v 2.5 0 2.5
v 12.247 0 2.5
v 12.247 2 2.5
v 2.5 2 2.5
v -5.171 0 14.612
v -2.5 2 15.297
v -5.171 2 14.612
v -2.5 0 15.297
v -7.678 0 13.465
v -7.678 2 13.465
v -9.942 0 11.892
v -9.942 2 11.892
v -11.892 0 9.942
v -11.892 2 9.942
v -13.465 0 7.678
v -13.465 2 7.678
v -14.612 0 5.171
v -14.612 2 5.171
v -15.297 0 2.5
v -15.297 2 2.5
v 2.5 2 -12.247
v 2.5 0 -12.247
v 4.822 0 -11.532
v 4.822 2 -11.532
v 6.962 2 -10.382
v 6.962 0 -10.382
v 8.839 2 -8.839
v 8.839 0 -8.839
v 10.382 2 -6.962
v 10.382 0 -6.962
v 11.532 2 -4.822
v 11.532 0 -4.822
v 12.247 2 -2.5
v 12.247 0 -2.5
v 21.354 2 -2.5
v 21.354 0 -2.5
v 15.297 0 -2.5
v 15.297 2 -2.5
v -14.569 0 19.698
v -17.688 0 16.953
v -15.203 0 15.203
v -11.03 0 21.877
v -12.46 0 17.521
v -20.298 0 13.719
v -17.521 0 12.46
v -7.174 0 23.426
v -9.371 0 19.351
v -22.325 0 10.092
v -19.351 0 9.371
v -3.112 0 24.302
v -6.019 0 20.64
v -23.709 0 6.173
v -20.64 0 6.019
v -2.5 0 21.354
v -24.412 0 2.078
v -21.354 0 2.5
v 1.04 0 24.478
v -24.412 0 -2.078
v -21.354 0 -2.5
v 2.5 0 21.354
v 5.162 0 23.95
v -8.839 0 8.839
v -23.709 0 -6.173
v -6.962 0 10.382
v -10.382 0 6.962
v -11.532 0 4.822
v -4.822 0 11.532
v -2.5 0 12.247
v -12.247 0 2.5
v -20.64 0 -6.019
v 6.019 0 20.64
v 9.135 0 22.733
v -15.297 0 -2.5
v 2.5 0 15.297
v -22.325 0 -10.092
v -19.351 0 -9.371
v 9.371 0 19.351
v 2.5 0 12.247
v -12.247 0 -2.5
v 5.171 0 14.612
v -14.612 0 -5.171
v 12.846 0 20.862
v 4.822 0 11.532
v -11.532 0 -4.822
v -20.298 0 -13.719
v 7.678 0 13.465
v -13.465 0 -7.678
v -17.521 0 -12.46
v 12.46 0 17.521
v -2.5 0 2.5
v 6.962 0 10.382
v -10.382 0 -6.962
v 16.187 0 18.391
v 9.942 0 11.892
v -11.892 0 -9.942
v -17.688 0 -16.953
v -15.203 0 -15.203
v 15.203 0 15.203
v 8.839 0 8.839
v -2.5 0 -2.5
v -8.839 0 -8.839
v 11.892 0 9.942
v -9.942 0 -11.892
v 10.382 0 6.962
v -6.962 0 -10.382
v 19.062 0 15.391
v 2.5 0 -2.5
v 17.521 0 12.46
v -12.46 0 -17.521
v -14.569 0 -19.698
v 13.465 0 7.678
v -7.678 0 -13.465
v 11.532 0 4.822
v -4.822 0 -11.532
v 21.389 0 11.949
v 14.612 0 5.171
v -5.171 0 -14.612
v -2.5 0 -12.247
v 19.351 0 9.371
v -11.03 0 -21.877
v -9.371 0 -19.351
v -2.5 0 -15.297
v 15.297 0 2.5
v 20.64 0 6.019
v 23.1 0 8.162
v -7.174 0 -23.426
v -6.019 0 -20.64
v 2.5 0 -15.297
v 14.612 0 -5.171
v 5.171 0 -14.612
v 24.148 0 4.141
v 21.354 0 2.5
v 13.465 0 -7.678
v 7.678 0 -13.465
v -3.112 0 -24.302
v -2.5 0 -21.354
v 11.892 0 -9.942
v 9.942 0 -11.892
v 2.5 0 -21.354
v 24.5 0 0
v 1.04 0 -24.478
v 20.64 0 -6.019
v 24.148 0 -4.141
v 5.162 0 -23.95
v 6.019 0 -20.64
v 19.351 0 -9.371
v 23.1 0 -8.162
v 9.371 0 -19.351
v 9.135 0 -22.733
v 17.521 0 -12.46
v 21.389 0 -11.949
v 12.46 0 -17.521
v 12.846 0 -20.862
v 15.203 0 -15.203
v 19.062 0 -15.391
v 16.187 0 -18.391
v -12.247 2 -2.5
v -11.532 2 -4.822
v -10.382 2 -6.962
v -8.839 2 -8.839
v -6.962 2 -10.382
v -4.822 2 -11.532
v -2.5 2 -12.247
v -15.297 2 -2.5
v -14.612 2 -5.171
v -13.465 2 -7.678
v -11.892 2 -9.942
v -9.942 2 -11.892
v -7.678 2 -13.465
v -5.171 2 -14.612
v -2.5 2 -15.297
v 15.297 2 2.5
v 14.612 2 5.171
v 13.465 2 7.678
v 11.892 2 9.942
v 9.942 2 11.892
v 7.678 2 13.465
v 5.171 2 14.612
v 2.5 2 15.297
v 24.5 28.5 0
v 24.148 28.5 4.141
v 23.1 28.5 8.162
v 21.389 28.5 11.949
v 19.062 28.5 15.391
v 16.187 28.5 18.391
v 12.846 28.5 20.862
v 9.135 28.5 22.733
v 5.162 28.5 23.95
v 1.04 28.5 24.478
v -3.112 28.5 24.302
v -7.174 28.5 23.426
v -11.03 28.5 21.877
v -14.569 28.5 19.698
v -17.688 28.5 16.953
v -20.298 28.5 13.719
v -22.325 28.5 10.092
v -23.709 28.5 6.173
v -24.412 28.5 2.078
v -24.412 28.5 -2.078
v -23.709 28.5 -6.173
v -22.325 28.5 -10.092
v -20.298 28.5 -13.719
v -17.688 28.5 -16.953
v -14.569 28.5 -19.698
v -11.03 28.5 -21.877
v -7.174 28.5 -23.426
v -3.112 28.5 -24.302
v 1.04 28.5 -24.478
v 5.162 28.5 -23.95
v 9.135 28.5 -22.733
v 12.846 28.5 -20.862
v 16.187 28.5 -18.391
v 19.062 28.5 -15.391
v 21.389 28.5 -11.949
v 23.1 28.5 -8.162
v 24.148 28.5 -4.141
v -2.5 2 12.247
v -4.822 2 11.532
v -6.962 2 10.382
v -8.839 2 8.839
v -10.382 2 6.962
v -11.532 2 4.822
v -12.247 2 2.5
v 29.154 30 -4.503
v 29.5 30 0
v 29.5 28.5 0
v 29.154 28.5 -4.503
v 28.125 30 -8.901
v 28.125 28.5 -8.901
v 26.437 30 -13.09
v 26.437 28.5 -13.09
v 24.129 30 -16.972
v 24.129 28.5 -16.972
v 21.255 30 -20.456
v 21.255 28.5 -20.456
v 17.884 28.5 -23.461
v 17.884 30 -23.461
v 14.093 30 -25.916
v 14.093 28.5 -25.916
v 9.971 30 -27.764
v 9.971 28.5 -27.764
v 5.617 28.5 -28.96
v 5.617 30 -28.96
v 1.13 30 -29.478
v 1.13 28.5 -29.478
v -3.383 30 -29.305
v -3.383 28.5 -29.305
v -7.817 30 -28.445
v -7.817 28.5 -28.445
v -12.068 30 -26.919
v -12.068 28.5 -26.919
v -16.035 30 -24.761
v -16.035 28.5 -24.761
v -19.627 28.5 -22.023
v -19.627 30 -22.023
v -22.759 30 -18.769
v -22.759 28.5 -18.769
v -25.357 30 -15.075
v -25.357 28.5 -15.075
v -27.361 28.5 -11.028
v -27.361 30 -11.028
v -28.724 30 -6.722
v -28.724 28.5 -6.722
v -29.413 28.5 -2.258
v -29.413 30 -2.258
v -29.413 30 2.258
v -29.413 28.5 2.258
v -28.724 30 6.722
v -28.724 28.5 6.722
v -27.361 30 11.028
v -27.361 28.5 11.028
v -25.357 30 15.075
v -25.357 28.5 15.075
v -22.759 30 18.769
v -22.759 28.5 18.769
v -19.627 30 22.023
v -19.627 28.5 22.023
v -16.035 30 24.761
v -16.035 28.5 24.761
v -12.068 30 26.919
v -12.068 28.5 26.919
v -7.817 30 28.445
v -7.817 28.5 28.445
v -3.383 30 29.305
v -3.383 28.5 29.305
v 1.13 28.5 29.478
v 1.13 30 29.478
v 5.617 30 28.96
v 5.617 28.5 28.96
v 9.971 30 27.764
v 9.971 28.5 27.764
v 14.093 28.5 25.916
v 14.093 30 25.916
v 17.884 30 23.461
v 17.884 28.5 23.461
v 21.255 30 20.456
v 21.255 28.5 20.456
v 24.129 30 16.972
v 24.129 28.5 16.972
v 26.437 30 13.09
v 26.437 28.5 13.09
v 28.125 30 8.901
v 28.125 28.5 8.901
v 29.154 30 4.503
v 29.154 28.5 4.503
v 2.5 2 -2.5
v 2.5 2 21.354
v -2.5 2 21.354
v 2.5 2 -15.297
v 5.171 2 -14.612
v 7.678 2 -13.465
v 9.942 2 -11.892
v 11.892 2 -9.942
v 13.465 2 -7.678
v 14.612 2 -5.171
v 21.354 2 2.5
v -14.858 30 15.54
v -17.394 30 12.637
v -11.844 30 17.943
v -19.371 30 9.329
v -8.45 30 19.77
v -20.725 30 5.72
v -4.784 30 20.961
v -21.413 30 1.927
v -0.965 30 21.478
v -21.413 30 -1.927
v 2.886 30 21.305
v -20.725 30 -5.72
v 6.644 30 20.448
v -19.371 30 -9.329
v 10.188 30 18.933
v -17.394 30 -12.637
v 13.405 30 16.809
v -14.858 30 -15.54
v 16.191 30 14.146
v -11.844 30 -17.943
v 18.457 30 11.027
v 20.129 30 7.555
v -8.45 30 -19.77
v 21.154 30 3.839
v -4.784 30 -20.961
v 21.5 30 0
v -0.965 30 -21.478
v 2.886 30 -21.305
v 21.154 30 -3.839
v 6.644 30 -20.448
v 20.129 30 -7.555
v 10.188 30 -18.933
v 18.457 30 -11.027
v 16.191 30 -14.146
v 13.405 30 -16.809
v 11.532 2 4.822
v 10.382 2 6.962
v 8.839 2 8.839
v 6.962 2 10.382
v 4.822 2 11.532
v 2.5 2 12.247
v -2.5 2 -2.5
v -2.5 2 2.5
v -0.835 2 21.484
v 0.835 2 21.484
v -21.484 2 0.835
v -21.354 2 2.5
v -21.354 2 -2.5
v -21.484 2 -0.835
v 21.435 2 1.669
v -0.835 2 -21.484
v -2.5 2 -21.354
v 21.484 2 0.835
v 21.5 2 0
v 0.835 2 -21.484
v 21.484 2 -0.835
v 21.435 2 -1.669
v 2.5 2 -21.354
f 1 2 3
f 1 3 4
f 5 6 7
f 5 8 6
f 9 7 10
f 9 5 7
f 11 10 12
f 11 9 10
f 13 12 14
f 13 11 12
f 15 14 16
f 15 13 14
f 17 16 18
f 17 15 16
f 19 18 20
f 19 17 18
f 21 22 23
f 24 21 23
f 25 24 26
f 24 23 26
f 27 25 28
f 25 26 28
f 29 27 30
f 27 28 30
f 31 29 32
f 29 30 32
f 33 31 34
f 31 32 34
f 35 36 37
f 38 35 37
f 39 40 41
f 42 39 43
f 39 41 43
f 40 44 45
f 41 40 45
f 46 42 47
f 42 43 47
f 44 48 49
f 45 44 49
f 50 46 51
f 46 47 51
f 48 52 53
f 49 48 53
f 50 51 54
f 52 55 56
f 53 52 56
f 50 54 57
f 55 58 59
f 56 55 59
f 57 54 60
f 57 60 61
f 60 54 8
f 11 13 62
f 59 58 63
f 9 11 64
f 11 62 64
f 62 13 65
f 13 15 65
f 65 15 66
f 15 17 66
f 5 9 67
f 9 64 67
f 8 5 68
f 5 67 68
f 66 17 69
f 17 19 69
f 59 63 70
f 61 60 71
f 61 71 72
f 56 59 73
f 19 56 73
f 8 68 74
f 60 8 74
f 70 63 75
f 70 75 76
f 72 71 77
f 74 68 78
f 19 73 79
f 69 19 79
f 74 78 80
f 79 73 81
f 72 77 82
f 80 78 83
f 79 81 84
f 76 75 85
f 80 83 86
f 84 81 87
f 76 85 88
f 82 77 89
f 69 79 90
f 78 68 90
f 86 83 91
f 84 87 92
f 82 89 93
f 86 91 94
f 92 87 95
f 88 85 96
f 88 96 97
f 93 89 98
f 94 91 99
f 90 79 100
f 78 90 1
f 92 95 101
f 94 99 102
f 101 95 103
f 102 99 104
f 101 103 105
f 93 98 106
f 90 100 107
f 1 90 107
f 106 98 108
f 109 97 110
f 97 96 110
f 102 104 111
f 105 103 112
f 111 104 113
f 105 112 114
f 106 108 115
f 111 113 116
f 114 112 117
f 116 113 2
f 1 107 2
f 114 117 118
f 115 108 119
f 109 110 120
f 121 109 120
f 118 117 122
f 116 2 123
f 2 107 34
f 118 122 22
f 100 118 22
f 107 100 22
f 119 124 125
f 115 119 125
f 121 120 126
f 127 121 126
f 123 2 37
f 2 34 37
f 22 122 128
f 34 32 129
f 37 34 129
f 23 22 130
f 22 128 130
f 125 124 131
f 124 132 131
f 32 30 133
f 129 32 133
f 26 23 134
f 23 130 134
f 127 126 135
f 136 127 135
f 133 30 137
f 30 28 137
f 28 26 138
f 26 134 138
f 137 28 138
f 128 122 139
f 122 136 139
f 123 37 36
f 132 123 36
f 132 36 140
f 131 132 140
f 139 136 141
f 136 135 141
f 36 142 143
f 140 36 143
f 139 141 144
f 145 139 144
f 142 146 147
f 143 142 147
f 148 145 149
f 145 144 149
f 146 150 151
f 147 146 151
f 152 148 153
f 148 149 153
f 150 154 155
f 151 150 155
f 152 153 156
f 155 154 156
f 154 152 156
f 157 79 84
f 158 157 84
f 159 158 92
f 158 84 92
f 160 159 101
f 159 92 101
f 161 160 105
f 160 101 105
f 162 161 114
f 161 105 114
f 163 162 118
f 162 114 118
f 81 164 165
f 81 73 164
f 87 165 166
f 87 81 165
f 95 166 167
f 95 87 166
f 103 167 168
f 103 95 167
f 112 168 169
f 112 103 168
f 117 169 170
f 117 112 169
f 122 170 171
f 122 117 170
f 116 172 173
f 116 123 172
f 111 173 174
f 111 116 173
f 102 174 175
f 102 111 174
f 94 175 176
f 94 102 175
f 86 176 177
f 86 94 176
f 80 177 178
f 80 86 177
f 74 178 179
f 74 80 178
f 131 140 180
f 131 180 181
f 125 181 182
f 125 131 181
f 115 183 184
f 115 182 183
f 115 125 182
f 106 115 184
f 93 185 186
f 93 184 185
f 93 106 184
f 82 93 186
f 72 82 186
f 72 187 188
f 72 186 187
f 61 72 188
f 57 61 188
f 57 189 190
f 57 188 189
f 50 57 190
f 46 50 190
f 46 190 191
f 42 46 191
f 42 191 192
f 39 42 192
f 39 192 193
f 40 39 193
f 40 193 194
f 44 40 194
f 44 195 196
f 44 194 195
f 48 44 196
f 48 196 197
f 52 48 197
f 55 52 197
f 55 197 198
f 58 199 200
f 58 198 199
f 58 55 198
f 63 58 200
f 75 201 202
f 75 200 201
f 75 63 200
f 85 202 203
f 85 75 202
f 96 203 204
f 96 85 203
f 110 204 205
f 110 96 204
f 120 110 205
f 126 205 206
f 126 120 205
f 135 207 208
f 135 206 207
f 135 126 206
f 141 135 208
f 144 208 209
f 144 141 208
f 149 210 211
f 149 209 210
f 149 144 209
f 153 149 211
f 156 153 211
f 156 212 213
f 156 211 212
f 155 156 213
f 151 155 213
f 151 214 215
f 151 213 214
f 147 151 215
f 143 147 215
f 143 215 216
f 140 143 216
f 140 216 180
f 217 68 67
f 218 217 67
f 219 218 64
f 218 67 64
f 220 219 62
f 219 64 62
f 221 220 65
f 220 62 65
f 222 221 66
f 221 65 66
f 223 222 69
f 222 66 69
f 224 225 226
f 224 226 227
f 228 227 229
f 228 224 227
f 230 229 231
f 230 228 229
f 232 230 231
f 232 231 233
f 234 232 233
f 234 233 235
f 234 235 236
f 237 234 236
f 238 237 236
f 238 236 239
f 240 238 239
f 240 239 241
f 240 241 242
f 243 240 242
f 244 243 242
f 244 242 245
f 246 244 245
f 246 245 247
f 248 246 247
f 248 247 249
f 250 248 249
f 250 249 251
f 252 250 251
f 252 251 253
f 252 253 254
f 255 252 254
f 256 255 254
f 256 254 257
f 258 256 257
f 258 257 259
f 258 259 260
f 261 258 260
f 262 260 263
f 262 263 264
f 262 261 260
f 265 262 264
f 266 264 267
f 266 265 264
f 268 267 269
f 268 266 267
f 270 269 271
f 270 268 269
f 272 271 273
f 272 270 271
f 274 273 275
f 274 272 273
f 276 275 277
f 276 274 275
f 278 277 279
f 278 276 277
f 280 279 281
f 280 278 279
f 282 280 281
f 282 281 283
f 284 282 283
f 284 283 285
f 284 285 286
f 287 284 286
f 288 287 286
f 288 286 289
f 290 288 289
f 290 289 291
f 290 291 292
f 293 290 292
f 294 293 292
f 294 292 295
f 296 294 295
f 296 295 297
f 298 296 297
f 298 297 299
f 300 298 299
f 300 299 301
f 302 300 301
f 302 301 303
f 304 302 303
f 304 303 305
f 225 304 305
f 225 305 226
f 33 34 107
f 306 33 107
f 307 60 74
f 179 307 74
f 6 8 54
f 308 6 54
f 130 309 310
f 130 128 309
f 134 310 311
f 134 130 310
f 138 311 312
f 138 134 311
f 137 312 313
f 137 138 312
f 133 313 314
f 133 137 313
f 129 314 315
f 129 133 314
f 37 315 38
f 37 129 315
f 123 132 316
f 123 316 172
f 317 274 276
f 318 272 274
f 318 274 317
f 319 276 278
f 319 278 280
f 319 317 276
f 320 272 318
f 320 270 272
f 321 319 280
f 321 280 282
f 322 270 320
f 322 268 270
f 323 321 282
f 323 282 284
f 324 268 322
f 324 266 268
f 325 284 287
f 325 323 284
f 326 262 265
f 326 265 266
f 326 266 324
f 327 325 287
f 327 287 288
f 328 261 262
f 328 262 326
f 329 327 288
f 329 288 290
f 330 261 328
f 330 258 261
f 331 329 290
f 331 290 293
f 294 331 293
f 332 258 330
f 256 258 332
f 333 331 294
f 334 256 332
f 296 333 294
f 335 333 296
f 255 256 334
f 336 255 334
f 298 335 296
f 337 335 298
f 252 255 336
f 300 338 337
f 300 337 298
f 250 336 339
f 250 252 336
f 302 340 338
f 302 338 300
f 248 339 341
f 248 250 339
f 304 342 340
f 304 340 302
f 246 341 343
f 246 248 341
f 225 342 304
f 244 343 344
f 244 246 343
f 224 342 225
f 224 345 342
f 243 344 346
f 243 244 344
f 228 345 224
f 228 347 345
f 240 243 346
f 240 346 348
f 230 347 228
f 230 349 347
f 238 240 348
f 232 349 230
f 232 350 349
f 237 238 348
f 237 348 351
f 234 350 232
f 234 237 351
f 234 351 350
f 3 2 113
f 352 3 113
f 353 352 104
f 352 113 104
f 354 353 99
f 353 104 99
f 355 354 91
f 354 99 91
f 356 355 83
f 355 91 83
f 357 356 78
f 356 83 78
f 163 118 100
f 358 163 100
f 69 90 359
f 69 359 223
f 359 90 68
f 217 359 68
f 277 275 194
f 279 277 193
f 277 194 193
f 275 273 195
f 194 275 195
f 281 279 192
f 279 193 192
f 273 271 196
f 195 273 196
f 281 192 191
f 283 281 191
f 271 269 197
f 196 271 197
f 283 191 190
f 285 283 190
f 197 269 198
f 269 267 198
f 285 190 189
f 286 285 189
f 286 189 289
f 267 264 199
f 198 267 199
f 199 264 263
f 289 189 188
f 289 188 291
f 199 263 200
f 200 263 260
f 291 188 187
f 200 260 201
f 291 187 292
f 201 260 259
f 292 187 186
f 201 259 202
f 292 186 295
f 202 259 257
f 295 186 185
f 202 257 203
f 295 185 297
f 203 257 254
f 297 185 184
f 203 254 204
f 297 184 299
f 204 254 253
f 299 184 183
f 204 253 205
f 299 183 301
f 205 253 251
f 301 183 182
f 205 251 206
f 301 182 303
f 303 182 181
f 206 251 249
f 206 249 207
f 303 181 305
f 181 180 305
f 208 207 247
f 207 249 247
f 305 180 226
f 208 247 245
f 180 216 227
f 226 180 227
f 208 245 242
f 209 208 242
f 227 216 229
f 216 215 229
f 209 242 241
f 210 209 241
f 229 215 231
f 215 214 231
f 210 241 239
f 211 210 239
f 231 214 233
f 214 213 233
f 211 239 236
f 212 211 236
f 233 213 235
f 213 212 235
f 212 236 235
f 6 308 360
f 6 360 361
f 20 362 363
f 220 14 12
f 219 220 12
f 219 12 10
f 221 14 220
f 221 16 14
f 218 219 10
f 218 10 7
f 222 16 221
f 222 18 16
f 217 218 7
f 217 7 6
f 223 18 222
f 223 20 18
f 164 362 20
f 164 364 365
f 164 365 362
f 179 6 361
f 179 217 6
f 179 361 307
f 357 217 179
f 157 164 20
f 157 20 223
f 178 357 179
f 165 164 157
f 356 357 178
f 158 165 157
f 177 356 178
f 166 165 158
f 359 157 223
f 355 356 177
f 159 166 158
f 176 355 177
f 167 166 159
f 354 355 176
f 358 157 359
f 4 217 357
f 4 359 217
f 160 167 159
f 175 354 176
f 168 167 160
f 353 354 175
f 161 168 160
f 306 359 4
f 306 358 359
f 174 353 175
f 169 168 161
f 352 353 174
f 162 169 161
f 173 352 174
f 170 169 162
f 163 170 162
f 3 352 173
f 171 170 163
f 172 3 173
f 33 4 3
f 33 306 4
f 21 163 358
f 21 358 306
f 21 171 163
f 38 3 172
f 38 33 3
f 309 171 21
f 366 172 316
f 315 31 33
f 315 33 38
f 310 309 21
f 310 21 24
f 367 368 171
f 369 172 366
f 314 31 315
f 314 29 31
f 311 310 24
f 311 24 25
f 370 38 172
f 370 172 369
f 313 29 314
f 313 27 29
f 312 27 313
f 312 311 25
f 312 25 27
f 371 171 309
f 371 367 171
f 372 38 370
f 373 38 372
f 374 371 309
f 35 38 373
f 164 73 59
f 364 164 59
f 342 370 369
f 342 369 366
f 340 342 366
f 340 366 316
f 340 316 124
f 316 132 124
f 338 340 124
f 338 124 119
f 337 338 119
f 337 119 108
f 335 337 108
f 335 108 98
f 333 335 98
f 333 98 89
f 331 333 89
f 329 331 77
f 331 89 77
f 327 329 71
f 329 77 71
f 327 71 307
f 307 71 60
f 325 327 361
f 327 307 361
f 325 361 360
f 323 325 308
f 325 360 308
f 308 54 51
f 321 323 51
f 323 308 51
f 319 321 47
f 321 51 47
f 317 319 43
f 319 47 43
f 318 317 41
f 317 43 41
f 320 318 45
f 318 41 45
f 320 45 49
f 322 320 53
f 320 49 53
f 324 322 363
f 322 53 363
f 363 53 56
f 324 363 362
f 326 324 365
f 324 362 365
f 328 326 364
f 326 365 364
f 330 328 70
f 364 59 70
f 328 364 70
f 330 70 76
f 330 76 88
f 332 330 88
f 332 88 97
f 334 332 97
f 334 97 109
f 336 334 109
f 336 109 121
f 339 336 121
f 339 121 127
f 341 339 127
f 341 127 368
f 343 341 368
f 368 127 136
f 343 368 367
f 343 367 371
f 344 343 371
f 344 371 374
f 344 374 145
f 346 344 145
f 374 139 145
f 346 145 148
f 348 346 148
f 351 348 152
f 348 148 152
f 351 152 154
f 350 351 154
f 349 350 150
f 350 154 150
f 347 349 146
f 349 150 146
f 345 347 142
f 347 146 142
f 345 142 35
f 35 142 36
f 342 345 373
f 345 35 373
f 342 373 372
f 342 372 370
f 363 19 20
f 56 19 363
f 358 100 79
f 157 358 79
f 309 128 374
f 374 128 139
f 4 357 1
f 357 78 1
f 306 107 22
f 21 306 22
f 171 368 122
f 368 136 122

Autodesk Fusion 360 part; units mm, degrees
sketch "スケッチ1" plane through (0, 0, 0) normal (0, 1, 0) x (1, 0, 0)
  line L0 (115.8209, 0) -> (-126.022, 0) construction
  line L1 (0, -92.6498) -> (0, 100.0832) construction
  circle A0 centre (0, 0) radius 24.5
  circle A1 centre (0, 0) radius 29.5
  circle A2 centre (0, 0) radius 21.5
  line L2 (21.3542, -2.5) -> (-21.3542, -2.5)
  line L3 (21.3542, 2.5) -> (-21.3542, 2.5)
  line L4 (2.5, -21.3542) -> (2.5, 21.3542)
  line L5 (-2.5, 21.4531) -> (-2.5, -21.3542)
  circle A3 centre (0, 0) radius 12.5
  circle A4 centre (0, 0) radius 15.5
  dimension "d1" = 49
  dimension "d2" = 59
  dimension "d3" = 43
  dimension "d4" = 2.5
  dimension "d5" = 2.5
  dimension "d6" = 2.5
  dimension "d7" = 2.5
  dimension "d8" = 25
  dimension "d9" = 31
extrude "押し出し1" add sketch "スケッチ1" along normal blind 2 contours A2 L2 L3 A4 | A2 L4 L5 A4 | L2 L3 A3 A4 | L3 L4 A3 A4 | A2 L4 L5 A4 | L2 L4 A3 A4 | L4 L5 A3 A4 | L2 L3 L4 A3 | L4 L5 A3 A4 | A2 L2 L3 A4 | L3 L5 A3 A4 | L3 L4 L5 A3 | L2 L3 L4 L5 | L2 L5 A3 A4 | L2 L4 L5 A3 | L2 L3 A3 A4 | L2 L3 L5 A3
extrude "押し出し2" add sketch "スケッチ1" along normal blind 30 contours A0
extrude "押し出し3" add sketch "スケッチ1" against normal blind 1.5 from surface at 30 contours A1
